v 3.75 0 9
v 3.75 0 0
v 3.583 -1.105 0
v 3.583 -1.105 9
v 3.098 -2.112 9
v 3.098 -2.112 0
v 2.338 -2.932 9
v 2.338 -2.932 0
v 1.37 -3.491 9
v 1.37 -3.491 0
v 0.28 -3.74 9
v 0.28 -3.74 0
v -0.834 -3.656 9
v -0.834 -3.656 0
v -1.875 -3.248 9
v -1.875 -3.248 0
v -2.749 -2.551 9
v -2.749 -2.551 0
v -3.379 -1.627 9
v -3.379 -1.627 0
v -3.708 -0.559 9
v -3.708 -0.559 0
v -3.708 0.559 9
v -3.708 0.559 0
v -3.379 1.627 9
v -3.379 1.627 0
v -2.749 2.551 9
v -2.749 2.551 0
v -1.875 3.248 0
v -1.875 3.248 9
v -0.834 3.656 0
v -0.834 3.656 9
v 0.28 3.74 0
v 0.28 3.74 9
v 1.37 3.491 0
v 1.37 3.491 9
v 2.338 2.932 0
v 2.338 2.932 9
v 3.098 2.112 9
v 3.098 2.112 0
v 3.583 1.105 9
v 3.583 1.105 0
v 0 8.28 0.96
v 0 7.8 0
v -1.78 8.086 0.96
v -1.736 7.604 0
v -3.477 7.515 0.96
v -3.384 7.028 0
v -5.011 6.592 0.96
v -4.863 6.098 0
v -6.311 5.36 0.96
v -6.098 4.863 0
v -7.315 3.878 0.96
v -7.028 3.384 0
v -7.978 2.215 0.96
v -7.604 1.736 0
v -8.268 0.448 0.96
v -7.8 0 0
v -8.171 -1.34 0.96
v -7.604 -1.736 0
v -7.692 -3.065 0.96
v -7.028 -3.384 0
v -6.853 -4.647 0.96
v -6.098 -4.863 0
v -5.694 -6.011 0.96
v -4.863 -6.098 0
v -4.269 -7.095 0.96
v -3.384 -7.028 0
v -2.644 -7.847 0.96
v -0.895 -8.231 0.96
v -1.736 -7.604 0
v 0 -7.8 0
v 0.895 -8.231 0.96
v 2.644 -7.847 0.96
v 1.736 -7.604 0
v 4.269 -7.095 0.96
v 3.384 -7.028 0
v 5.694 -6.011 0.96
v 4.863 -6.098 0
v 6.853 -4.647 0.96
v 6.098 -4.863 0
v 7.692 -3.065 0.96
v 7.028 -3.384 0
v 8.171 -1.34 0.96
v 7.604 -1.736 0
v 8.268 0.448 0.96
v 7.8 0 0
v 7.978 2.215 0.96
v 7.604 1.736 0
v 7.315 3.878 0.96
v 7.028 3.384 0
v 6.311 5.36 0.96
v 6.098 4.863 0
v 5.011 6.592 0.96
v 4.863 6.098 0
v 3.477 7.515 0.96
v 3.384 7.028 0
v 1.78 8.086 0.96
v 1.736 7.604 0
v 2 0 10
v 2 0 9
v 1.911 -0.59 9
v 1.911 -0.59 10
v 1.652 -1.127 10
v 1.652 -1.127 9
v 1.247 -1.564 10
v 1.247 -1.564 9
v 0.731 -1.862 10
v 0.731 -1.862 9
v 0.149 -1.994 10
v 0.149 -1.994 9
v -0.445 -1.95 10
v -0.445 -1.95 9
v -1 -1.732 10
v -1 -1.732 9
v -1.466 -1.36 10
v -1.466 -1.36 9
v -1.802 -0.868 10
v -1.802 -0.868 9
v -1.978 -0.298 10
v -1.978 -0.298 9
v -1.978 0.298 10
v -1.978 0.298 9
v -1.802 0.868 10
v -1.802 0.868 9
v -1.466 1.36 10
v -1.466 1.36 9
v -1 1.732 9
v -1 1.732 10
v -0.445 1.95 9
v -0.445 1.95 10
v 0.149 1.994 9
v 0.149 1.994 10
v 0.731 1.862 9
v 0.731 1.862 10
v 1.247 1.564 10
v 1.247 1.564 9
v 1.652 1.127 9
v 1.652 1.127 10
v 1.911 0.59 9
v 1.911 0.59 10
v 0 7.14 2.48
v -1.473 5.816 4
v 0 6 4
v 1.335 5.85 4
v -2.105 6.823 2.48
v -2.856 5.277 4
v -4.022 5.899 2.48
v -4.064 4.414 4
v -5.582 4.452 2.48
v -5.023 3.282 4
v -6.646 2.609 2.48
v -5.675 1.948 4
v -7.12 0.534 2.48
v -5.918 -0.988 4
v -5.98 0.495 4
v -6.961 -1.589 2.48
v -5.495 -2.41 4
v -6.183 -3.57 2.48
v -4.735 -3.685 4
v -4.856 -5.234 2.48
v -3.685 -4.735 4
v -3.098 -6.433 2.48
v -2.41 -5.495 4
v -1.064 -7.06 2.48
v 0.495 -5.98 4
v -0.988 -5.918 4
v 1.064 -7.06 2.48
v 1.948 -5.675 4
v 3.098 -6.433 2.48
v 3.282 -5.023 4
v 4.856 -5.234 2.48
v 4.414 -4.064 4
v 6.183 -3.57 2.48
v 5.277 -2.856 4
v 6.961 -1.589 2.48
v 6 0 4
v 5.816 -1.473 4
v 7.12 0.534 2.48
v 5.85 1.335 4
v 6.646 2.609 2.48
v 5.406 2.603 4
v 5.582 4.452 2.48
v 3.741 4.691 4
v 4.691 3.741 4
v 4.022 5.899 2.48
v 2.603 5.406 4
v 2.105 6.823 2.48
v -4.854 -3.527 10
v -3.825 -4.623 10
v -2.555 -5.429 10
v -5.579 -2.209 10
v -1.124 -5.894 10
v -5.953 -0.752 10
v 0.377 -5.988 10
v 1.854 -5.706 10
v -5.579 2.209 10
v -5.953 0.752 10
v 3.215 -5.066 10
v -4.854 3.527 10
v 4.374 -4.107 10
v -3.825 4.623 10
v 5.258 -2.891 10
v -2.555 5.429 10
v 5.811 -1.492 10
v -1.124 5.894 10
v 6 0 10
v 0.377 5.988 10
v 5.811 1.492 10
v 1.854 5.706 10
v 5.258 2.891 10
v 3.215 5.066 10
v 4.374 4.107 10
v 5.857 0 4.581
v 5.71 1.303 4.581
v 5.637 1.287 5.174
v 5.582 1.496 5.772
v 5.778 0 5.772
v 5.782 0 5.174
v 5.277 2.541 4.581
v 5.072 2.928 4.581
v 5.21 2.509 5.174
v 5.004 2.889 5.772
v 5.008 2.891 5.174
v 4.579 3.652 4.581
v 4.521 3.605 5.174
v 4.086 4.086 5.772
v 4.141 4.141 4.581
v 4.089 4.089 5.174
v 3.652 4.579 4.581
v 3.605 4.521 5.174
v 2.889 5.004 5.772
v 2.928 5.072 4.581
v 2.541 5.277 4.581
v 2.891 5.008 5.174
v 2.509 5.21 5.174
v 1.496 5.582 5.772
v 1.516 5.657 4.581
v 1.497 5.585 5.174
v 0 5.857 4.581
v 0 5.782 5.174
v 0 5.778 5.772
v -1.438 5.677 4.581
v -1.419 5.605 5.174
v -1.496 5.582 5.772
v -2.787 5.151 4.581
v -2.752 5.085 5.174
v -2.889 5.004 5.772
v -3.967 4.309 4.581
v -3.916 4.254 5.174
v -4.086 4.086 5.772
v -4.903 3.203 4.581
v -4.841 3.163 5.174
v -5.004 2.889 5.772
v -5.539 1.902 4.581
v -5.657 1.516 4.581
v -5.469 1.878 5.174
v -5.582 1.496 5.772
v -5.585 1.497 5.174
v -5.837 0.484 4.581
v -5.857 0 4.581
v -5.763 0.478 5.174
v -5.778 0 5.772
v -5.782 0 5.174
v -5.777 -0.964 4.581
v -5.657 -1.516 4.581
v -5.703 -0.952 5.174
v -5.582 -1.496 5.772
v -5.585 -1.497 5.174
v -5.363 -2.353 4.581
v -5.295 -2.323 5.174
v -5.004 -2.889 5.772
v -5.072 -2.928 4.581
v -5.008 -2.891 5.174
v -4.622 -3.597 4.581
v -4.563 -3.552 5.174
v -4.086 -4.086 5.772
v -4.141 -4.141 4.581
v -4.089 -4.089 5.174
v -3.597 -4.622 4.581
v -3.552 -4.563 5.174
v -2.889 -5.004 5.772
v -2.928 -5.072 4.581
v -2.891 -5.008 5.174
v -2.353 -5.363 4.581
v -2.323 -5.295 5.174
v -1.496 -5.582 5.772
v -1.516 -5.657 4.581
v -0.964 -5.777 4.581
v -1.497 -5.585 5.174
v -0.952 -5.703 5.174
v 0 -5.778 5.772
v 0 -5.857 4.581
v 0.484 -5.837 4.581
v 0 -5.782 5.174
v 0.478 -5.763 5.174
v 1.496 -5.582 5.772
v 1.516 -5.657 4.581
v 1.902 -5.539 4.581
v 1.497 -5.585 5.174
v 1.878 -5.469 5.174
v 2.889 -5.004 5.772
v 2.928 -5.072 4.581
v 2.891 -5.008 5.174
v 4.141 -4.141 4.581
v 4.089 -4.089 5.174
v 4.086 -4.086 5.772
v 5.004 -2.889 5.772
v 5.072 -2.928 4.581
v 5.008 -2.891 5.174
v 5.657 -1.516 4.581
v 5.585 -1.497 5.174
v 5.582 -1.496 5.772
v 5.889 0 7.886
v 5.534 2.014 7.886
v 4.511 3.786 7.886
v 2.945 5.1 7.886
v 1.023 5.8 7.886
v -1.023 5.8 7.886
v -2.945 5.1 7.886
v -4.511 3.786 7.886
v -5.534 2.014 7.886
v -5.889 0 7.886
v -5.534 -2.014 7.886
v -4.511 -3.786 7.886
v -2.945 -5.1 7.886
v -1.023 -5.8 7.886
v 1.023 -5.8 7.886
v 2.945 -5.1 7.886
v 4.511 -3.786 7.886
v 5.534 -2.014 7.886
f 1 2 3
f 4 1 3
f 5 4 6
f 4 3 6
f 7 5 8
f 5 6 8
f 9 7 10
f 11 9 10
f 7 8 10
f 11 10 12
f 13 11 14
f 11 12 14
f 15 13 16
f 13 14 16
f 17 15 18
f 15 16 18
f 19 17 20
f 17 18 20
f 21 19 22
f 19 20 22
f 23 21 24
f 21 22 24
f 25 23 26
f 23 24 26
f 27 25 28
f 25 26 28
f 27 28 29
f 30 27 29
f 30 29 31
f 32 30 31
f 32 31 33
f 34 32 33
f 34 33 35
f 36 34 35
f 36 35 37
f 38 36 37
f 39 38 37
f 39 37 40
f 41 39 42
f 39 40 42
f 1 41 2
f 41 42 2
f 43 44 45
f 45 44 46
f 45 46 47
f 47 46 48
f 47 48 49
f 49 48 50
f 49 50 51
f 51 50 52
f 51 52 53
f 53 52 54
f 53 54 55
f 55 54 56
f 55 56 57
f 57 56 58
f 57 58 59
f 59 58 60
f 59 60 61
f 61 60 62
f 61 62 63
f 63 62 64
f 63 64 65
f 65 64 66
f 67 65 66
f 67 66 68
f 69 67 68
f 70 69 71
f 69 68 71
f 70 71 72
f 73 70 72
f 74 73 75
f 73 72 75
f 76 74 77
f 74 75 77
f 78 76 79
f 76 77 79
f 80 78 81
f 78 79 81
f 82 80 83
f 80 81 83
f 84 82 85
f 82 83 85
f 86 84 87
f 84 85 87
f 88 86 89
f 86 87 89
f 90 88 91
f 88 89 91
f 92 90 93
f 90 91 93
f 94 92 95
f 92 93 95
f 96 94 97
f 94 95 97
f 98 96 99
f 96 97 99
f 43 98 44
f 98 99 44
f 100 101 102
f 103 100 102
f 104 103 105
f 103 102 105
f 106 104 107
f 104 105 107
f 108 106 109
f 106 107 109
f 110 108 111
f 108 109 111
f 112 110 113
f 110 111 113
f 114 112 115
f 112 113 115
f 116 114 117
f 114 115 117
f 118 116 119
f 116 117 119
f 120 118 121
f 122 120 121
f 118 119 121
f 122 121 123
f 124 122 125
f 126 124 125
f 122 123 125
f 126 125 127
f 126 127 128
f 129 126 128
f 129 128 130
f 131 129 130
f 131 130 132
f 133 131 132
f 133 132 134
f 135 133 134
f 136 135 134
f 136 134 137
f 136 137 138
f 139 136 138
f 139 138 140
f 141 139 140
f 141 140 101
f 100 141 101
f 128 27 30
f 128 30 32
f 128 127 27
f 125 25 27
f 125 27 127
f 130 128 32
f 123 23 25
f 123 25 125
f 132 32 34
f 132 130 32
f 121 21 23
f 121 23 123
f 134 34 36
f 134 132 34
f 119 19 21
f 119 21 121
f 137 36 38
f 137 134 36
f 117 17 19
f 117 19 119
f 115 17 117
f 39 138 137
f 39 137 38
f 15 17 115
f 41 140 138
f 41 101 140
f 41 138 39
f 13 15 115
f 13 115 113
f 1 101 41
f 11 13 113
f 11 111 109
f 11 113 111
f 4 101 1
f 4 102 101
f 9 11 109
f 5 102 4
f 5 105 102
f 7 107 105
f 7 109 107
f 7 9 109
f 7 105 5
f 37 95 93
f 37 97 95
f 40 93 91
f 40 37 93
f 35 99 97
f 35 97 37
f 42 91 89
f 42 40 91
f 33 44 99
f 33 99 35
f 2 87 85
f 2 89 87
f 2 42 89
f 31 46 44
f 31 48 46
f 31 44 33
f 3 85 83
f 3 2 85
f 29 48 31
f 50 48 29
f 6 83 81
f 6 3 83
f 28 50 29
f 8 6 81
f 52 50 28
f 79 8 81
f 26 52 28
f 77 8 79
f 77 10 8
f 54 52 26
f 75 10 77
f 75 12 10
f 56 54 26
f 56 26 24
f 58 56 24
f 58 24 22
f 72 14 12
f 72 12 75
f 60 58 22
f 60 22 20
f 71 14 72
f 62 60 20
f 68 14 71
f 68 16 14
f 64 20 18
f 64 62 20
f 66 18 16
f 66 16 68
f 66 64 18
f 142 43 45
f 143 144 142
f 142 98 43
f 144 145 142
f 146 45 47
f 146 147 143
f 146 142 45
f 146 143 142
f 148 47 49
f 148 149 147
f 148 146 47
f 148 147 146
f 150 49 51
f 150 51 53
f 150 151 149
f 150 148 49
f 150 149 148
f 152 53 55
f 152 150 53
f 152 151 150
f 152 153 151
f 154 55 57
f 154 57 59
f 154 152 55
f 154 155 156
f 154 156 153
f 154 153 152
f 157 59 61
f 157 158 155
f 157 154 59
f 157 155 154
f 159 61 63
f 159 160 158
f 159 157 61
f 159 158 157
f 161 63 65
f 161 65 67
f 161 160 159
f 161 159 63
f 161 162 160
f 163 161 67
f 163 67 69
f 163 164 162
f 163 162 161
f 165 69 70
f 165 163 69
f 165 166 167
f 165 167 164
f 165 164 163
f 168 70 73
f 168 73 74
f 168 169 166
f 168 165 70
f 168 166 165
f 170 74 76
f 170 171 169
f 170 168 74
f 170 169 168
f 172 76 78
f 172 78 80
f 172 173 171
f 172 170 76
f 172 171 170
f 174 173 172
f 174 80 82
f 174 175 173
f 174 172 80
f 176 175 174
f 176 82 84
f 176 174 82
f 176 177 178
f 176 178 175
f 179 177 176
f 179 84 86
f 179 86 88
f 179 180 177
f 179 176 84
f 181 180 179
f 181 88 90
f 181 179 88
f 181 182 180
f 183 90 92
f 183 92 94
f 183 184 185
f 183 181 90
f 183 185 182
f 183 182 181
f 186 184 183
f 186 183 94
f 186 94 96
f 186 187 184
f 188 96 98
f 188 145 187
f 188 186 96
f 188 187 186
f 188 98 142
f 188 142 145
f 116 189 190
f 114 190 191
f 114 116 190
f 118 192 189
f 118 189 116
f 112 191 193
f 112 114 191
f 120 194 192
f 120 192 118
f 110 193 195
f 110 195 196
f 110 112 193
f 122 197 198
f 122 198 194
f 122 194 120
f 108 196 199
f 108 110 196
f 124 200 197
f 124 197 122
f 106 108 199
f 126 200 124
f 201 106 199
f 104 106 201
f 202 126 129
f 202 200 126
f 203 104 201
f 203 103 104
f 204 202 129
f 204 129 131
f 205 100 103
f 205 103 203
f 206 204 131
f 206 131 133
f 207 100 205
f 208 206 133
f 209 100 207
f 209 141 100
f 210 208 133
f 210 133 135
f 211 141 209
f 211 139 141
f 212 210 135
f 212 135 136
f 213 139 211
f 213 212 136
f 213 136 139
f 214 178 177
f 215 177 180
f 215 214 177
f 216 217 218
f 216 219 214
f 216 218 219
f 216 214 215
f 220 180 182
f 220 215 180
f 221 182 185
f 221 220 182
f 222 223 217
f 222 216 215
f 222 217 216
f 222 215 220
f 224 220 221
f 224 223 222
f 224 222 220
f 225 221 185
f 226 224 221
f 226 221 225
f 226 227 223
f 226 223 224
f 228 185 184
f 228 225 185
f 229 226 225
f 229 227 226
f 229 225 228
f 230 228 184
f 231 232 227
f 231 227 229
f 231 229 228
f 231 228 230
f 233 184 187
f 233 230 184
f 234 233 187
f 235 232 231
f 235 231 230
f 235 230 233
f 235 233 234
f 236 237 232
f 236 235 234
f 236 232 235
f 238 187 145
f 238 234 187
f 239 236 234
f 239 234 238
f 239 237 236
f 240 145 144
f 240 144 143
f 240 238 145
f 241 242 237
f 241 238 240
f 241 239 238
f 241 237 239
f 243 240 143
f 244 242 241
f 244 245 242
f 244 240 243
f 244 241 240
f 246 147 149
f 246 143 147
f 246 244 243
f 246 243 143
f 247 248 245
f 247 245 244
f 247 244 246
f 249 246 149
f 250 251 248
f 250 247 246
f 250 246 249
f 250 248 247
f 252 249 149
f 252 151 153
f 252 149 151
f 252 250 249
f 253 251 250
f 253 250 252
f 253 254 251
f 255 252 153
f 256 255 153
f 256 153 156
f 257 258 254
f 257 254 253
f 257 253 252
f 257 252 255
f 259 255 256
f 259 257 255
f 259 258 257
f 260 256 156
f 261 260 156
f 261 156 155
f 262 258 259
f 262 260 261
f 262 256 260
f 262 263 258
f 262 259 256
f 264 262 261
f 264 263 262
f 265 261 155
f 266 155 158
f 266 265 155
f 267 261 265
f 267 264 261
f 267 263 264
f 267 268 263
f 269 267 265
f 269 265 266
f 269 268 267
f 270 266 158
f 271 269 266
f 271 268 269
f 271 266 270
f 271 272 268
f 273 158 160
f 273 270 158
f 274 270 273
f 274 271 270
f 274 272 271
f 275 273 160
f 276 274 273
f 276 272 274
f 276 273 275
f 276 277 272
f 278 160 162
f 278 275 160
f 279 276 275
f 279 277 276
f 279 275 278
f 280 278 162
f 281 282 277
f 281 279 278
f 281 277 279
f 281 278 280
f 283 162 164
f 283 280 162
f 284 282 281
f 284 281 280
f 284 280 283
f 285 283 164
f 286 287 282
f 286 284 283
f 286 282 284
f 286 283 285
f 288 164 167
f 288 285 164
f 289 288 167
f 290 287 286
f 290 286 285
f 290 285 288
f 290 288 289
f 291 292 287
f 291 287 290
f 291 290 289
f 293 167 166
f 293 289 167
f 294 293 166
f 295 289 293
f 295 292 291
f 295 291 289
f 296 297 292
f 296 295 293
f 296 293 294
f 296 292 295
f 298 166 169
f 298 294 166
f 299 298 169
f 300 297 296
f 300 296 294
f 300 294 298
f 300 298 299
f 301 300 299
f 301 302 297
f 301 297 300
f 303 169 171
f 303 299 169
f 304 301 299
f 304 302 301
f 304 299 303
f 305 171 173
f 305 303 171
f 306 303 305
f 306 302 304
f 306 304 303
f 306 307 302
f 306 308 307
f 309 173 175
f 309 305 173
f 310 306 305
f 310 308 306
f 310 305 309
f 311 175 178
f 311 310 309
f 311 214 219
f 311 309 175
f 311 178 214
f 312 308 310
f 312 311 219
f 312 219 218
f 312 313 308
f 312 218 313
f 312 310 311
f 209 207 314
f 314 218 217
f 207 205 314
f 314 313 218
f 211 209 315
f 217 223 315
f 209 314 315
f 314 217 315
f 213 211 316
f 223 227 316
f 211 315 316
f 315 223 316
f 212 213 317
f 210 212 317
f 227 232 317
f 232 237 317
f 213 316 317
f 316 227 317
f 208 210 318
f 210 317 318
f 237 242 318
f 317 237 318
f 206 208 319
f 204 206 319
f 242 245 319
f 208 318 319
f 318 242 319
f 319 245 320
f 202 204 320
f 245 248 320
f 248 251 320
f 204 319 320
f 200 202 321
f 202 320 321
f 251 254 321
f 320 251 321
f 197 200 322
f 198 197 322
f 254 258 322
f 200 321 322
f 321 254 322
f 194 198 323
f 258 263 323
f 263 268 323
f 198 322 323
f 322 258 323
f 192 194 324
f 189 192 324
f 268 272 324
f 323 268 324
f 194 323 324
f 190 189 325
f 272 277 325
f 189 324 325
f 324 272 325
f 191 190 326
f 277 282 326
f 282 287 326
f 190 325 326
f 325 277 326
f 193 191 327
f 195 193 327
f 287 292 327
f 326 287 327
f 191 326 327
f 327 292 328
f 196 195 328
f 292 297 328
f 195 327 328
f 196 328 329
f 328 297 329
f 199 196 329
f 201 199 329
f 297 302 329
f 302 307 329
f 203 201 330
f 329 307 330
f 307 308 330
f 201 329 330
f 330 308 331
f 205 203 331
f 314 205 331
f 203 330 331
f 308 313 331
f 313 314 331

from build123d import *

# Parameters (mm, degrees)
F0_R     = 6
F1_DEPTH = 10
F4_R     = 3.75
F5_DEPTH = 9
F6_R     = 2
F7_DEPTH = 3.5
F11_SIZE = 1.2


# Not quite as in the source:
# - a fillet or chamfer that OpenCascade refuses, or shapes differently, is made with other operations: its cross-section is extruded or revolved along the edge and cut away or added


with BuildPart() as f1:
    # F0 (on Top) → F1 (new body)
    with BuildSketch(Plane.XY):
        Circle(F0_R)
    extrude(amount=F1_DEPTH)

    # F2 (on Right) → F3 (revolve)
    with BuildSketch(Plane.YZ):
        Polygon((9, 0), (6, 4), (6, 0), align=None)
    revolve(axis=Axis((0, 0, 0), (0, 0, 1)))

    # F4 (on face) → F5 (cut)
    with BuildSketch(Plane(origin=(0, 0, 0), x_dir=(1, 0, 0), z_dir=(0, 0, -1))):
        Circle(F4_R)
    extrude(amount=-F5_DEPTH, mode=Mode.SUBTRACT)

    # F6 (on face) → F7 (cut)
    with BuildSketch(Plane(origin=(0, 0, 9), x_dir=(1, 0, 0), z_dir=(0, 0, -1))):
        Circle(F6_R)
    extrude(amount=-F7_DEPTH, mode=Mode.SUBTRACT)

    # F8 (on Front) → F9 (revolve, cut)
    with BuildSketch(Plane.XZ):
        Polygon((6, 4), (6, 10), (5.6855533243, 4), align=None)
    revolve(axis=Axis((0, 0, 10), (0, 0, 1)), mode=Mode.SUBTRACT)

    # F10: fillet of radius 5.08 on 1 edges, made by hand

    # F10_s1 → F10_t2 (revolve)
    with BuildSketch(Plane.XZ):
        with BuildLine():
            ThreePointArc((6, 4), (5.8107107389, 4.8763729429), (5.7784395282, 5.7723743538))
            Line((5.7784395282, 5.7723743538), (5.6769787675, 5.7776916869))
            Line((5.6769787675, 5.7776916869), (5.5840925636, 4.0053173332))
            Line((5.5840925636, 4.0053173332), (5.6855533243, 3.8984))
            ThreePointArc((5.6855533243, 3.8984), (5.8427766622, 3.8984), (5.9029704487, 3.9698698461))
            Line((5.9029704487, 3.9698698461), (6, 4))
        make_face()
    revolve(axis=Axis((0, 0, 4), (0, 0, 1)))

    # F11
    f11_edges = [f1.edges().sort_by_distance(p)[0] for p in [
        (0, -9, 0),
    ]]
    chamfer(f11_edges, length=F11_SIZE)


solid = f1.part
